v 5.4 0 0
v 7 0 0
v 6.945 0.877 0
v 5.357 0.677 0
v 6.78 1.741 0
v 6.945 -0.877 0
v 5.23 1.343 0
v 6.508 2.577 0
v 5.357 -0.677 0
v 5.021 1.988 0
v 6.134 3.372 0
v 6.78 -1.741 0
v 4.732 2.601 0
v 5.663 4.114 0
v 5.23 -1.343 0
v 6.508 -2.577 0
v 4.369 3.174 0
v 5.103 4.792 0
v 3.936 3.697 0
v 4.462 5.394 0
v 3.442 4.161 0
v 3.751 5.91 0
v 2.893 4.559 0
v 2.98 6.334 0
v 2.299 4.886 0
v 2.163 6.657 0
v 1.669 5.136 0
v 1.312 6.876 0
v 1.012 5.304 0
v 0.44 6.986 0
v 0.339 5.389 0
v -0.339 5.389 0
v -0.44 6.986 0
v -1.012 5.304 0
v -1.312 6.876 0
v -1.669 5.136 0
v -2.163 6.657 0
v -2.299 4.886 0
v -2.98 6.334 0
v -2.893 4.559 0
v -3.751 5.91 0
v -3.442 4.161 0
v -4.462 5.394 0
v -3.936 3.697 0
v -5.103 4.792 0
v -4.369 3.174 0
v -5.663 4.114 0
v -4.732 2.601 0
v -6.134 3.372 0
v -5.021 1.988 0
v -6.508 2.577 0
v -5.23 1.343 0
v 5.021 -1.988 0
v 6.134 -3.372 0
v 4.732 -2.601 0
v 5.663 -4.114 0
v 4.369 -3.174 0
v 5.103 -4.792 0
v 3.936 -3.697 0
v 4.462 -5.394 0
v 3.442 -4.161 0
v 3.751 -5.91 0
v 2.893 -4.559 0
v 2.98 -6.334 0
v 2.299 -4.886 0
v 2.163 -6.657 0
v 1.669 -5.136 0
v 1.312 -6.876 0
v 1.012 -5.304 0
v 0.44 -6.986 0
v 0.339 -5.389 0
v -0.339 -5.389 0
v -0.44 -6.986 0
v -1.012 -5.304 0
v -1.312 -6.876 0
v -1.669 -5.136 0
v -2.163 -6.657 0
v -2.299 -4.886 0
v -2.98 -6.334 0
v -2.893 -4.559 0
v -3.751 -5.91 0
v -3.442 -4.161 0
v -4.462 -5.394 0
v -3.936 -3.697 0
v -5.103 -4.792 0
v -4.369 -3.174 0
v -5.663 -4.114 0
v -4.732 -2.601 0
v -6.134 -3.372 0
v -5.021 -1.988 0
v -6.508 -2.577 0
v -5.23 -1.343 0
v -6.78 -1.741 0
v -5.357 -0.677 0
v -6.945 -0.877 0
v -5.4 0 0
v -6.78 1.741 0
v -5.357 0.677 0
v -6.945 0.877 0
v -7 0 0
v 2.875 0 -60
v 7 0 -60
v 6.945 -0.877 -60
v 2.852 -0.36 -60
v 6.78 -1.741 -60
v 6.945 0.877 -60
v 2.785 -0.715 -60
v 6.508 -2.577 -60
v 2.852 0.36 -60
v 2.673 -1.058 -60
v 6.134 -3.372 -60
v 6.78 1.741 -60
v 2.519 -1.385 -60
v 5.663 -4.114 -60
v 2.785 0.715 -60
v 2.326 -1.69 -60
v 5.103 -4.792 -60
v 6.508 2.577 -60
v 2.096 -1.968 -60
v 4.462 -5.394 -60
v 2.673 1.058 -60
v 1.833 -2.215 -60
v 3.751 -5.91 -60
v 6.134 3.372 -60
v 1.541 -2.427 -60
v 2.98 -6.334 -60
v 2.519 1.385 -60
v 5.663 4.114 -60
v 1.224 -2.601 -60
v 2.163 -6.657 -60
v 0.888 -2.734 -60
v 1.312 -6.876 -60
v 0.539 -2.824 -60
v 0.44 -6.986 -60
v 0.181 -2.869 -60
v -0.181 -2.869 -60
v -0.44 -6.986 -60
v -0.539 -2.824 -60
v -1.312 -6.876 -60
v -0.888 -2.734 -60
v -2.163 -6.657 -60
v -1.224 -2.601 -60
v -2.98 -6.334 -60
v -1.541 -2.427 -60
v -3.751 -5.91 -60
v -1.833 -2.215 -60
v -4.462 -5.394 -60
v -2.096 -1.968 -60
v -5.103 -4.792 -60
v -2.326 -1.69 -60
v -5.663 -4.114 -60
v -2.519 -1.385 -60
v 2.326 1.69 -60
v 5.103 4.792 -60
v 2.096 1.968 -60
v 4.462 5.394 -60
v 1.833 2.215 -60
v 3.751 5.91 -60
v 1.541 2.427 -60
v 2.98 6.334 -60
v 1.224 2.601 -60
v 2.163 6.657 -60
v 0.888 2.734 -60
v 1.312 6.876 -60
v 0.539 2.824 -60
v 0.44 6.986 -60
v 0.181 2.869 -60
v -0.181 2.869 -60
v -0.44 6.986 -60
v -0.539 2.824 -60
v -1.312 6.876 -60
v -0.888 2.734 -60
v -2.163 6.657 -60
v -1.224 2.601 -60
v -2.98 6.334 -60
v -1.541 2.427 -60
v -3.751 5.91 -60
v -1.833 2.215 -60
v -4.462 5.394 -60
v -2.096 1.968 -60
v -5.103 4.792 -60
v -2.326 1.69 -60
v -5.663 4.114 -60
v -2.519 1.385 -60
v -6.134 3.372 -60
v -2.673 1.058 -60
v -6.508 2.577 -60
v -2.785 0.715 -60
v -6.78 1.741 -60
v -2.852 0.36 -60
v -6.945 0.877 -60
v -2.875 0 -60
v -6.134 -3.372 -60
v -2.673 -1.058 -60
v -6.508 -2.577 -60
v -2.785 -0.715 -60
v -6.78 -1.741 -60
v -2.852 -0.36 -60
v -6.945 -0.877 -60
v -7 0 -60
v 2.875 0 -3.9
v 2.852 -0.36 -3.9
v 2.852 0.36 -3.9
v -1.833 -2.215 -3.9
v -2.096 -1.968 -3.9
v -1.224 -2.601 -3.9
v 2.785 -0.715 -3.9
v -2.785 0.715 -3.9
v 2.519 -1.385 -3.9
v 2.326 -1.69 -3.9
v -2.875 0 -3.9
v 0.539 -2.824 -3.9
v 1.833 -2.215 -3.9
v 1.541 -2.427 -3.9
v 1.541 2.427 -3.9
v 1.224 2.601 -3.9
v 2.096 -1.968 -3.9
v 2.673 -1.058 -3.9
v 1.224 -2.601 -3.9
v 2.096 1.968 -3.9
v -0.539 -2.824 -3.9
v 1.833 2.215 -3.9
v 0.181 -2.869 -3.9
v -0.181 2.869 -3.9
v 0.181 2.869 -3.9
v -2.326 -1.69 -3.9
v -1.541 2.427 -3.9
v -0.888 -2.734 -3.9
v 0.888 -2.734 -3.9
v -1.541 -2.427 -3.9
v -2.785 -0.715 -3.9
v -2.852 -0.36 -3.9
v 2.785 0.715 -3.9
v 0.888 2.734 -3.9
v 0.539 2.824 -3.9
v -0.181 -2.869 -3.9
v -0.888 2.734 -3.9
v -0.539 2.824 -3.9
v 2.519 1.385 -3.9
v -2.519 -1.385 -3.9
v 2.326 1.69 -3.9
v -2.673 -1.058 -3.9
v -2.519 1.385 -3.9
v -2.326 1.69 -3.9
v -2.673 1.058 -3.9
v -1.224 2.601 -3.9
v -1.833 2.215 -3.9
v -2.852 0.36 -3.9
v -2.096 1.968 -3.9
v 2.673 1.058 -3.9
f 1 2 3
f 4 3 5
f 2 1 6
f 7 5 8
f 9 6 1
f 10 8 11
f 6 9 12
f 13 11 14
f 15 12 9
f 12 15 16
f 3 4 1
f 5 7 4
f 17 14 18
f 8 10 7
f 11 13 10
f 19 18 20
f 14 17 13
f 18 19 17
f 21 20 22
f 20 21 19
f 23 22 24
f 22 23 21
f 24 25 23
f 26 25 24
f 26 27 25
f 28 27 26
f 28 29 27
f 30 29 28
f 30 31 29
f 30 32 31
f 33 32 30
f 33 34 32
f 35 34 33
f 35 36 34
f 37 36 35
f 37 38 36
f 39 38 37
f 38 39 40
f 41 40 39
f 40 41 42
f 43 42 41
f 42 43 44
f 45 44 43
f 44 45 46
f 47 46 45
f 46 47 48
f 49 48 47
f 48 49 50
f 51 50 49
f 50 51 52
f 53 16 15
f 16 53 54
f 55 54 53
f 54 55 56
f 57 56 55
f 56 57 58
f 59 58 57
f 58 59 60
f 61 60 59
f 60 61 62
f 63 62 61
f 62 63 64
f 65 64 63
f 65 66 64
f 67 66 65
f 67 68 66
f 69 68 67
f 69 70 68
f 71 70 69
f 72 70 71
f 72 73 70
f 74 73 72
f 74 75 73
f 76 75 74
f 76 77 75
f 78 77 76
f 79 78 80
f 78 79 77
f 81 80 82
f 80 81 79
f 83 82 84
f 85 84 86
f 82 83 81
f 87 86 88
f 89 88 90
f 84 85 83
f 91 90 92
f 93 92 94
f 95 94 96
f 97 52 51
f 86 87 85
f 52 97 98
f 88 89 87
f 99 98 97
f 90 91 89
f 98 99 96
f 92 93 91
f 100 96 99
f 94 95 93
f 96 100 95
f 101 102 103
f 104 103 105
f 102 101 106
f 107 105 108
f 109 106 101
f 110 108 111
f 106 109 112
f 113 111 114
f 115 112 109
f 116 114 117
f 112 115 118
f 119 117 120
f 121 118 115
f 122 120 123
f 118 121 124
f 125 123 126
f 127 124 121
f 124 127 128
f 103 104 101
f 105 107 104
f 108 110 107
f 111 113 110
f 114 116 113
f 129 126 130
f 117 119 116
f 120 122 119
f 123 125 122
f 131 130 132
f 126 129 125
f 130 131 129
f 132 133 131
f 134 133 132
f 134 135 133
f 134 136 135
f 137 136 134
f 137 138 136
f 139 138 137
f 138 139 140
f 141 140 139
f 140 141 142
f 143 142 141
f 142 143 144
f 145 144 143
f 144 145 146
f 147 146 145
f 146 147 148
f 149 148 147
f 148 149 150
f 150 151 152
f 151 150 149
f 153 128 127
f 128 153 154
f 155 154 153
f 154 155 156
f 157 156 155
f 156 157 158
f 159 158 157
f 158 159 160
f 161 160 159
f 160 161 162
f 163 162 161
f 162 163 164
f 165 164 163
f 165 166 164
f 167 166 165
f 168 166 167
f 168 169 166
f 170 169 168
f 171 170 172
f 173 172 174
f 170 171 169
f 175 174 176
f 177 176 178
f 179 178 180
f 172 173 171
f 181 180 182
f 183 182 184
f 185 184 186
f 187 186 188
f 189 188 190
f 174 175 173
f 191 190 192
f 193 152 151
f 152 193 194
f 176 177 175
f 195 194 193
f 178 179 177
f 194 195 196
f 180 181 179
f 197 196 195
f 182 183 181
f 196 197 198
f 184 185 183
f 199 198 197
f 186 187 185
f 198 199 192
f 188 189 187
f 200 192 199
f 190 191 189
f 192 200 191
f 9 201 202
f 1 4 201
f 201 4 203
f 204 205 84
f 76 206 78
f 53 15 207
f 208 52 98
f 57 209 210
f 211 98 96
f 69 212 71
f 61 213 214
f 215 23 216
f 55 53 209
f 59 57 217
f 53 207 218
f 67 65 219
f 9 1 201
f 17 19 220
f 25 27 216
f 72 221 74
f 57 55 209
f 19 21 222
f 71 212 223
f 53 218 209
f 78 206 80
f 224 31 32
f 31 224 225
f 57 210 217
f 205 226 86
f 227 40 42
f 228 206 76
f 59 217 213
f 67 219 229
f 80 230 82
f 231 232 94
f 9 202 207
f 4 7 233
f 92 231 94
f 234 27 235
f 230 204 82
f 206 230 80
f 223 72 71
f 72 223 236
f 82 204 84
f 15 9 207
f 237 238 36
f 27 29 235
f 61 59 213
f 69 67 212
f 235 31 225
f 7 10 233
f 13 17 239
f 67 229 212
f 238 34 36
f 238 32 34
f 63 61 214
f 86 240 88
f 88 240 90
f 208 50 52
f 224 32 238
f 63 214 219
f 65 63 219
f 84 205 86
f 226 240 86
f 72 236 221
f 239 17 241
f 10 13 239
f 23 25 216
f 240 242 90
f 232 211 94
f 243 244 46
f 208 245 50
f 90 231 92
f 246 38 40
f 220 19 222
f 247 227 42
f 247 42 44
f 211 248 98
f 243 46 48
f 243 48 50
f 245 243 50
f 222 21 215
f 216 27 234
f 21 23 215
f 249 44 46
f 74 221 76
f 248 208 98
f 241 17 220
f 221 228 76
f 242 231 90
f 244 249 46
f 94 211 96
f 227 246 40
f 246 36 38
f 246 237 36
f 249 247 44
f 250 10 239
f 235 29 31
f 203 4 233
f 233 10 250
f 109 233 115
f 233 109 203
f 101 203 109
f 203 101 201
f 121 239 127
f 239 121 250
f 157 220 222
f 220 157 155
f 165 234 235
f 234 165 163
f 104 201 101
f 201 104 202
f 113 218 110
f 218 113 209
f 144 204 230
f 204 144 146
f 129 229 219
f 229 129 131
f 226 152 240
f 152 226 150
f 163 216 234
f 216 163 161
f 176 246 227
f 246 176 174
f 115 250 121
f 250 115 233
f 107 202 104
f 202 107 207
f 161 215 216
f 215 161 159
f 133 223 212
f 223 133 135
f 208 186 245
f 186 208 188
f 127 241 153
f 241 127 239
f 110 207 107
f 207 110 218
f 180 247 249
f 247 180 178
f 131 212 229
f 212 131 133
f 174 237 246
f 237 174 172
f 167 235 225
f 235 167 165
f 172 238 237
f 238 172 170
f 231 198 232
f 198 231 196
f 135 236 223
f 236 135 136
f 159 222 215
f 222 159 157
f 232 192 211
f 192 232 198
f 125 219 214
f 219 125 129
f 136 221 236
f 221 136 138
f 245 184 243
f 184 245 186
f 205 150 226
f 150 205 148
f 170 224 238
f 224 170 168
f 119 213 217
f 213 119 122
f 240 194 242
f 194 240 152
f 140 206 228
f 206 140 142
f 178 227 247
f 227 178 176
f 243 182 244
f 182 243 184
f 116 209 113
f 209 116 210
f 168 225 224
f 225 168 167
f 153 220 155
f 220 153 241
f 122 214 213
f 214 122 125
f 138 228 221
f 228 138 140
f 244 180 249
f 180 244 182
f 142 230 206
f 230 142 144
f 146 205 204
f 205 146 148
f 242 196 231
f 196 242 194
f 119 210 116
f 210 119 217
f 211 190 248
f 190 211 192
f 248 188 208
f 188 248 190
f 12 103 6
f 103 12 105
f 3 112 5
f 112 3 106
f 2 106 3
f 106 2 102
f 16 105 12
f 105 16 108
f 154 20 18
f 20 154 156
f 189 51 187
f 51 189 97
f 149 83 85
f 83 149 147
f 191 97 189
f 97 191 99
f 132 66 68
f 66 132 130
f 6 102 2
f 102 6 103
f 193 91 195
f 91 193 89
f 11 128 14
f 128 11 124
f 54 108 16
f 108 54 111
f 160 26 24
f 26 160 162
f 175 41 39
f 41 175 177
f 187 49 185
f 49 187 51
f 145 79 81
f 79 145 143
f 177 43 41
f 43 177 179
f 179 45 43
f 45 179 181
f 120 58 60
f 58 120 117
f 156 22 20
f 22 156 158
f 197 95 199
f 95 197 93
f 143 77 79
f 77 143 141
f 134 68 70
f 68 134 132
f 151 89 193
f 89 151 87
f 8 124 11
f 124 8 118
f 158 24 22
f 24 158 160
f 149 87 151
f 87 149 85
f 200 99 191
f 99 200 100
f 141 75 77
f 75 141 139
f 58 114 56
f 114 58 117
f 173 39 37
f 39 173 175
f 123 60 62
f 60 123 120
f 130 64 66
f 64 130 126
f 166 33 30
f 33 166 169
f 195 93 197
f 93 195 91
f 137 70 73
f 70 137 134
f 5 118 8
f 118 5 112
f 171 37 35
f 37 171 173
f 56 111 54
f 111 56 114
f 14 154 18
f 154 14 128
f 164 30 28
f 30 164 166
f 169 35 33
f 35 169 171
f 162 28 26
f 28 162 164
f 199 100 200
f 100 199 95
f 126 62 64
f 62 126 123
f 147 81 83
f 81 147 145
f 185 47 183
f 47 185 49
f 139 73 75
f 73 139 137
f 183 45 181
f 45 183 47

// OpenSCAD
$fn = 50;


difference() {
	union() {
		translate(v = [0, 0, -60.0000000000]) {
			cylinder(h = 60, r = 7.0000000000);
		}
		cylinder(h = 0, r = 17.0000000000);
	}
	union() {
		translate(v = [0, 0, 0]) {
			rotate(a = [0, 0, 0]) {
				difference() {
					union() {
						#translate(v = [0, 0, -60.0000000000]) {
							cylinder(h = 60, r = 2.6000000000);
						}
						#translate(v = [0, 0, -3.9000000000]) {
							cylinder(h = 3.9000000000, r1 = 2.8750000000, r2 = 5.4000000000);
						}
						#translate(v = [0, 0, -60.0000000000]) {
							cylinder(h = 60, r = 2.8750000000);
						}
						#translate(v = [0, 0, -60.0000000000]) {
							cylinder(h = 60, r = 2.6000000000);
						}
					}
					union();
				}
			}
		}
	}
}
